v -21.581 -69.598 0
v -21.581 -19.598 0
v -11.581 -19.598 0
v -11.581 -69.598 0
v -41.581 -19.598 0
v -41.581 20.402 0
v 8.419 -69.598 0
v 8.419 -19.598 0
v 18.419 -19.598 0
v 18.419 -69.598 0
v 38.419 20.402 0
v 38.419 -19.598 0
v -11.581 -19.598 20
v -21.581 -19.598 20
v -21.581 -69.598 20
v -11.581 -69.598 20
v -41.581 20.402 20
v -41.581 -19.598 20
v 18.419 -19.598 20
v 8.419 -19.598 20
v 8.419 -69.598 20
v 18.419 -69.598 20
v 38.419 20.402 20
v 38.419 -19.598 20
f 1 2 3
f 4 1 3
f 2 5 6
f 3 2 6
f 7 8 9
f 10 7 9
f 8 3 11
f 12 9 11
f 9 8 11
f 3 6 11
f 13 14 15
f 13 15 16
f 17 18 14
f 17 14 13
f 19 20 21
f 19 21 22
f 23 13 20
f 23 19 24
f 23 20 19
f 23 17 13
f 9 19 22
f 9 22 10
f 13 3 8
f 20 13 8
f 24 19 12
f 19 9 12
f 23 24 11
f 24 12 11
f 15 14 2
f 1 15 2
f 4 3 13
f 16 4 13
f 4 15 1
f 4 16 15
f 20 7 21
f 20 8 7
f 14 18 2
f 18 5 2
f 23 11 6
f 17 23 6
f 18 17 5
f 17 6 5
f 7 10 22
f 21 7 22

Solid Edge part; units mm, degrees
sketch "Sketch1" plane through (0, 0, 0) normal (0, 0, 1) x (1, 0, 0)
  line L0 (-41.5811, -19.5976) -> (38.4189, -19.5976)
  line L1 (38.4189, -19.5976) -> (38.4189, 20.4024)
  line L2 (38.4189, 20.4024) -> (-41.5811, 20.4024)
  line L3 (-41.5811, 20.4024) -> (-41.5811, -19.5976)
extrude "Protrusion1" add sketch "Sketch1" along normal blind 20
sketch "Sketch2" plane through (-1.5811, -19.5976, 10) normal (0, -1, 0) x (1, 0, 0)
  line L0 (-20, 10) -> (-20, -10)
  line L1 (-20, -10) -> (-10, -10)
  line L2 (-10, -10) -> (-10, 10)
  line L3 (-10, 10) -> (-20, 10)
  line L4 (20, 10) -> (20, -10)
  line L5 (20, -10) -> (10, -10)
  line L6 (10, -10) -> (10, 10)
  line L7 (10, 10) -> (20, 10)
extrude "ExtrudedProtrusion_2" add sketch "Sketch2" along normal blind 50
